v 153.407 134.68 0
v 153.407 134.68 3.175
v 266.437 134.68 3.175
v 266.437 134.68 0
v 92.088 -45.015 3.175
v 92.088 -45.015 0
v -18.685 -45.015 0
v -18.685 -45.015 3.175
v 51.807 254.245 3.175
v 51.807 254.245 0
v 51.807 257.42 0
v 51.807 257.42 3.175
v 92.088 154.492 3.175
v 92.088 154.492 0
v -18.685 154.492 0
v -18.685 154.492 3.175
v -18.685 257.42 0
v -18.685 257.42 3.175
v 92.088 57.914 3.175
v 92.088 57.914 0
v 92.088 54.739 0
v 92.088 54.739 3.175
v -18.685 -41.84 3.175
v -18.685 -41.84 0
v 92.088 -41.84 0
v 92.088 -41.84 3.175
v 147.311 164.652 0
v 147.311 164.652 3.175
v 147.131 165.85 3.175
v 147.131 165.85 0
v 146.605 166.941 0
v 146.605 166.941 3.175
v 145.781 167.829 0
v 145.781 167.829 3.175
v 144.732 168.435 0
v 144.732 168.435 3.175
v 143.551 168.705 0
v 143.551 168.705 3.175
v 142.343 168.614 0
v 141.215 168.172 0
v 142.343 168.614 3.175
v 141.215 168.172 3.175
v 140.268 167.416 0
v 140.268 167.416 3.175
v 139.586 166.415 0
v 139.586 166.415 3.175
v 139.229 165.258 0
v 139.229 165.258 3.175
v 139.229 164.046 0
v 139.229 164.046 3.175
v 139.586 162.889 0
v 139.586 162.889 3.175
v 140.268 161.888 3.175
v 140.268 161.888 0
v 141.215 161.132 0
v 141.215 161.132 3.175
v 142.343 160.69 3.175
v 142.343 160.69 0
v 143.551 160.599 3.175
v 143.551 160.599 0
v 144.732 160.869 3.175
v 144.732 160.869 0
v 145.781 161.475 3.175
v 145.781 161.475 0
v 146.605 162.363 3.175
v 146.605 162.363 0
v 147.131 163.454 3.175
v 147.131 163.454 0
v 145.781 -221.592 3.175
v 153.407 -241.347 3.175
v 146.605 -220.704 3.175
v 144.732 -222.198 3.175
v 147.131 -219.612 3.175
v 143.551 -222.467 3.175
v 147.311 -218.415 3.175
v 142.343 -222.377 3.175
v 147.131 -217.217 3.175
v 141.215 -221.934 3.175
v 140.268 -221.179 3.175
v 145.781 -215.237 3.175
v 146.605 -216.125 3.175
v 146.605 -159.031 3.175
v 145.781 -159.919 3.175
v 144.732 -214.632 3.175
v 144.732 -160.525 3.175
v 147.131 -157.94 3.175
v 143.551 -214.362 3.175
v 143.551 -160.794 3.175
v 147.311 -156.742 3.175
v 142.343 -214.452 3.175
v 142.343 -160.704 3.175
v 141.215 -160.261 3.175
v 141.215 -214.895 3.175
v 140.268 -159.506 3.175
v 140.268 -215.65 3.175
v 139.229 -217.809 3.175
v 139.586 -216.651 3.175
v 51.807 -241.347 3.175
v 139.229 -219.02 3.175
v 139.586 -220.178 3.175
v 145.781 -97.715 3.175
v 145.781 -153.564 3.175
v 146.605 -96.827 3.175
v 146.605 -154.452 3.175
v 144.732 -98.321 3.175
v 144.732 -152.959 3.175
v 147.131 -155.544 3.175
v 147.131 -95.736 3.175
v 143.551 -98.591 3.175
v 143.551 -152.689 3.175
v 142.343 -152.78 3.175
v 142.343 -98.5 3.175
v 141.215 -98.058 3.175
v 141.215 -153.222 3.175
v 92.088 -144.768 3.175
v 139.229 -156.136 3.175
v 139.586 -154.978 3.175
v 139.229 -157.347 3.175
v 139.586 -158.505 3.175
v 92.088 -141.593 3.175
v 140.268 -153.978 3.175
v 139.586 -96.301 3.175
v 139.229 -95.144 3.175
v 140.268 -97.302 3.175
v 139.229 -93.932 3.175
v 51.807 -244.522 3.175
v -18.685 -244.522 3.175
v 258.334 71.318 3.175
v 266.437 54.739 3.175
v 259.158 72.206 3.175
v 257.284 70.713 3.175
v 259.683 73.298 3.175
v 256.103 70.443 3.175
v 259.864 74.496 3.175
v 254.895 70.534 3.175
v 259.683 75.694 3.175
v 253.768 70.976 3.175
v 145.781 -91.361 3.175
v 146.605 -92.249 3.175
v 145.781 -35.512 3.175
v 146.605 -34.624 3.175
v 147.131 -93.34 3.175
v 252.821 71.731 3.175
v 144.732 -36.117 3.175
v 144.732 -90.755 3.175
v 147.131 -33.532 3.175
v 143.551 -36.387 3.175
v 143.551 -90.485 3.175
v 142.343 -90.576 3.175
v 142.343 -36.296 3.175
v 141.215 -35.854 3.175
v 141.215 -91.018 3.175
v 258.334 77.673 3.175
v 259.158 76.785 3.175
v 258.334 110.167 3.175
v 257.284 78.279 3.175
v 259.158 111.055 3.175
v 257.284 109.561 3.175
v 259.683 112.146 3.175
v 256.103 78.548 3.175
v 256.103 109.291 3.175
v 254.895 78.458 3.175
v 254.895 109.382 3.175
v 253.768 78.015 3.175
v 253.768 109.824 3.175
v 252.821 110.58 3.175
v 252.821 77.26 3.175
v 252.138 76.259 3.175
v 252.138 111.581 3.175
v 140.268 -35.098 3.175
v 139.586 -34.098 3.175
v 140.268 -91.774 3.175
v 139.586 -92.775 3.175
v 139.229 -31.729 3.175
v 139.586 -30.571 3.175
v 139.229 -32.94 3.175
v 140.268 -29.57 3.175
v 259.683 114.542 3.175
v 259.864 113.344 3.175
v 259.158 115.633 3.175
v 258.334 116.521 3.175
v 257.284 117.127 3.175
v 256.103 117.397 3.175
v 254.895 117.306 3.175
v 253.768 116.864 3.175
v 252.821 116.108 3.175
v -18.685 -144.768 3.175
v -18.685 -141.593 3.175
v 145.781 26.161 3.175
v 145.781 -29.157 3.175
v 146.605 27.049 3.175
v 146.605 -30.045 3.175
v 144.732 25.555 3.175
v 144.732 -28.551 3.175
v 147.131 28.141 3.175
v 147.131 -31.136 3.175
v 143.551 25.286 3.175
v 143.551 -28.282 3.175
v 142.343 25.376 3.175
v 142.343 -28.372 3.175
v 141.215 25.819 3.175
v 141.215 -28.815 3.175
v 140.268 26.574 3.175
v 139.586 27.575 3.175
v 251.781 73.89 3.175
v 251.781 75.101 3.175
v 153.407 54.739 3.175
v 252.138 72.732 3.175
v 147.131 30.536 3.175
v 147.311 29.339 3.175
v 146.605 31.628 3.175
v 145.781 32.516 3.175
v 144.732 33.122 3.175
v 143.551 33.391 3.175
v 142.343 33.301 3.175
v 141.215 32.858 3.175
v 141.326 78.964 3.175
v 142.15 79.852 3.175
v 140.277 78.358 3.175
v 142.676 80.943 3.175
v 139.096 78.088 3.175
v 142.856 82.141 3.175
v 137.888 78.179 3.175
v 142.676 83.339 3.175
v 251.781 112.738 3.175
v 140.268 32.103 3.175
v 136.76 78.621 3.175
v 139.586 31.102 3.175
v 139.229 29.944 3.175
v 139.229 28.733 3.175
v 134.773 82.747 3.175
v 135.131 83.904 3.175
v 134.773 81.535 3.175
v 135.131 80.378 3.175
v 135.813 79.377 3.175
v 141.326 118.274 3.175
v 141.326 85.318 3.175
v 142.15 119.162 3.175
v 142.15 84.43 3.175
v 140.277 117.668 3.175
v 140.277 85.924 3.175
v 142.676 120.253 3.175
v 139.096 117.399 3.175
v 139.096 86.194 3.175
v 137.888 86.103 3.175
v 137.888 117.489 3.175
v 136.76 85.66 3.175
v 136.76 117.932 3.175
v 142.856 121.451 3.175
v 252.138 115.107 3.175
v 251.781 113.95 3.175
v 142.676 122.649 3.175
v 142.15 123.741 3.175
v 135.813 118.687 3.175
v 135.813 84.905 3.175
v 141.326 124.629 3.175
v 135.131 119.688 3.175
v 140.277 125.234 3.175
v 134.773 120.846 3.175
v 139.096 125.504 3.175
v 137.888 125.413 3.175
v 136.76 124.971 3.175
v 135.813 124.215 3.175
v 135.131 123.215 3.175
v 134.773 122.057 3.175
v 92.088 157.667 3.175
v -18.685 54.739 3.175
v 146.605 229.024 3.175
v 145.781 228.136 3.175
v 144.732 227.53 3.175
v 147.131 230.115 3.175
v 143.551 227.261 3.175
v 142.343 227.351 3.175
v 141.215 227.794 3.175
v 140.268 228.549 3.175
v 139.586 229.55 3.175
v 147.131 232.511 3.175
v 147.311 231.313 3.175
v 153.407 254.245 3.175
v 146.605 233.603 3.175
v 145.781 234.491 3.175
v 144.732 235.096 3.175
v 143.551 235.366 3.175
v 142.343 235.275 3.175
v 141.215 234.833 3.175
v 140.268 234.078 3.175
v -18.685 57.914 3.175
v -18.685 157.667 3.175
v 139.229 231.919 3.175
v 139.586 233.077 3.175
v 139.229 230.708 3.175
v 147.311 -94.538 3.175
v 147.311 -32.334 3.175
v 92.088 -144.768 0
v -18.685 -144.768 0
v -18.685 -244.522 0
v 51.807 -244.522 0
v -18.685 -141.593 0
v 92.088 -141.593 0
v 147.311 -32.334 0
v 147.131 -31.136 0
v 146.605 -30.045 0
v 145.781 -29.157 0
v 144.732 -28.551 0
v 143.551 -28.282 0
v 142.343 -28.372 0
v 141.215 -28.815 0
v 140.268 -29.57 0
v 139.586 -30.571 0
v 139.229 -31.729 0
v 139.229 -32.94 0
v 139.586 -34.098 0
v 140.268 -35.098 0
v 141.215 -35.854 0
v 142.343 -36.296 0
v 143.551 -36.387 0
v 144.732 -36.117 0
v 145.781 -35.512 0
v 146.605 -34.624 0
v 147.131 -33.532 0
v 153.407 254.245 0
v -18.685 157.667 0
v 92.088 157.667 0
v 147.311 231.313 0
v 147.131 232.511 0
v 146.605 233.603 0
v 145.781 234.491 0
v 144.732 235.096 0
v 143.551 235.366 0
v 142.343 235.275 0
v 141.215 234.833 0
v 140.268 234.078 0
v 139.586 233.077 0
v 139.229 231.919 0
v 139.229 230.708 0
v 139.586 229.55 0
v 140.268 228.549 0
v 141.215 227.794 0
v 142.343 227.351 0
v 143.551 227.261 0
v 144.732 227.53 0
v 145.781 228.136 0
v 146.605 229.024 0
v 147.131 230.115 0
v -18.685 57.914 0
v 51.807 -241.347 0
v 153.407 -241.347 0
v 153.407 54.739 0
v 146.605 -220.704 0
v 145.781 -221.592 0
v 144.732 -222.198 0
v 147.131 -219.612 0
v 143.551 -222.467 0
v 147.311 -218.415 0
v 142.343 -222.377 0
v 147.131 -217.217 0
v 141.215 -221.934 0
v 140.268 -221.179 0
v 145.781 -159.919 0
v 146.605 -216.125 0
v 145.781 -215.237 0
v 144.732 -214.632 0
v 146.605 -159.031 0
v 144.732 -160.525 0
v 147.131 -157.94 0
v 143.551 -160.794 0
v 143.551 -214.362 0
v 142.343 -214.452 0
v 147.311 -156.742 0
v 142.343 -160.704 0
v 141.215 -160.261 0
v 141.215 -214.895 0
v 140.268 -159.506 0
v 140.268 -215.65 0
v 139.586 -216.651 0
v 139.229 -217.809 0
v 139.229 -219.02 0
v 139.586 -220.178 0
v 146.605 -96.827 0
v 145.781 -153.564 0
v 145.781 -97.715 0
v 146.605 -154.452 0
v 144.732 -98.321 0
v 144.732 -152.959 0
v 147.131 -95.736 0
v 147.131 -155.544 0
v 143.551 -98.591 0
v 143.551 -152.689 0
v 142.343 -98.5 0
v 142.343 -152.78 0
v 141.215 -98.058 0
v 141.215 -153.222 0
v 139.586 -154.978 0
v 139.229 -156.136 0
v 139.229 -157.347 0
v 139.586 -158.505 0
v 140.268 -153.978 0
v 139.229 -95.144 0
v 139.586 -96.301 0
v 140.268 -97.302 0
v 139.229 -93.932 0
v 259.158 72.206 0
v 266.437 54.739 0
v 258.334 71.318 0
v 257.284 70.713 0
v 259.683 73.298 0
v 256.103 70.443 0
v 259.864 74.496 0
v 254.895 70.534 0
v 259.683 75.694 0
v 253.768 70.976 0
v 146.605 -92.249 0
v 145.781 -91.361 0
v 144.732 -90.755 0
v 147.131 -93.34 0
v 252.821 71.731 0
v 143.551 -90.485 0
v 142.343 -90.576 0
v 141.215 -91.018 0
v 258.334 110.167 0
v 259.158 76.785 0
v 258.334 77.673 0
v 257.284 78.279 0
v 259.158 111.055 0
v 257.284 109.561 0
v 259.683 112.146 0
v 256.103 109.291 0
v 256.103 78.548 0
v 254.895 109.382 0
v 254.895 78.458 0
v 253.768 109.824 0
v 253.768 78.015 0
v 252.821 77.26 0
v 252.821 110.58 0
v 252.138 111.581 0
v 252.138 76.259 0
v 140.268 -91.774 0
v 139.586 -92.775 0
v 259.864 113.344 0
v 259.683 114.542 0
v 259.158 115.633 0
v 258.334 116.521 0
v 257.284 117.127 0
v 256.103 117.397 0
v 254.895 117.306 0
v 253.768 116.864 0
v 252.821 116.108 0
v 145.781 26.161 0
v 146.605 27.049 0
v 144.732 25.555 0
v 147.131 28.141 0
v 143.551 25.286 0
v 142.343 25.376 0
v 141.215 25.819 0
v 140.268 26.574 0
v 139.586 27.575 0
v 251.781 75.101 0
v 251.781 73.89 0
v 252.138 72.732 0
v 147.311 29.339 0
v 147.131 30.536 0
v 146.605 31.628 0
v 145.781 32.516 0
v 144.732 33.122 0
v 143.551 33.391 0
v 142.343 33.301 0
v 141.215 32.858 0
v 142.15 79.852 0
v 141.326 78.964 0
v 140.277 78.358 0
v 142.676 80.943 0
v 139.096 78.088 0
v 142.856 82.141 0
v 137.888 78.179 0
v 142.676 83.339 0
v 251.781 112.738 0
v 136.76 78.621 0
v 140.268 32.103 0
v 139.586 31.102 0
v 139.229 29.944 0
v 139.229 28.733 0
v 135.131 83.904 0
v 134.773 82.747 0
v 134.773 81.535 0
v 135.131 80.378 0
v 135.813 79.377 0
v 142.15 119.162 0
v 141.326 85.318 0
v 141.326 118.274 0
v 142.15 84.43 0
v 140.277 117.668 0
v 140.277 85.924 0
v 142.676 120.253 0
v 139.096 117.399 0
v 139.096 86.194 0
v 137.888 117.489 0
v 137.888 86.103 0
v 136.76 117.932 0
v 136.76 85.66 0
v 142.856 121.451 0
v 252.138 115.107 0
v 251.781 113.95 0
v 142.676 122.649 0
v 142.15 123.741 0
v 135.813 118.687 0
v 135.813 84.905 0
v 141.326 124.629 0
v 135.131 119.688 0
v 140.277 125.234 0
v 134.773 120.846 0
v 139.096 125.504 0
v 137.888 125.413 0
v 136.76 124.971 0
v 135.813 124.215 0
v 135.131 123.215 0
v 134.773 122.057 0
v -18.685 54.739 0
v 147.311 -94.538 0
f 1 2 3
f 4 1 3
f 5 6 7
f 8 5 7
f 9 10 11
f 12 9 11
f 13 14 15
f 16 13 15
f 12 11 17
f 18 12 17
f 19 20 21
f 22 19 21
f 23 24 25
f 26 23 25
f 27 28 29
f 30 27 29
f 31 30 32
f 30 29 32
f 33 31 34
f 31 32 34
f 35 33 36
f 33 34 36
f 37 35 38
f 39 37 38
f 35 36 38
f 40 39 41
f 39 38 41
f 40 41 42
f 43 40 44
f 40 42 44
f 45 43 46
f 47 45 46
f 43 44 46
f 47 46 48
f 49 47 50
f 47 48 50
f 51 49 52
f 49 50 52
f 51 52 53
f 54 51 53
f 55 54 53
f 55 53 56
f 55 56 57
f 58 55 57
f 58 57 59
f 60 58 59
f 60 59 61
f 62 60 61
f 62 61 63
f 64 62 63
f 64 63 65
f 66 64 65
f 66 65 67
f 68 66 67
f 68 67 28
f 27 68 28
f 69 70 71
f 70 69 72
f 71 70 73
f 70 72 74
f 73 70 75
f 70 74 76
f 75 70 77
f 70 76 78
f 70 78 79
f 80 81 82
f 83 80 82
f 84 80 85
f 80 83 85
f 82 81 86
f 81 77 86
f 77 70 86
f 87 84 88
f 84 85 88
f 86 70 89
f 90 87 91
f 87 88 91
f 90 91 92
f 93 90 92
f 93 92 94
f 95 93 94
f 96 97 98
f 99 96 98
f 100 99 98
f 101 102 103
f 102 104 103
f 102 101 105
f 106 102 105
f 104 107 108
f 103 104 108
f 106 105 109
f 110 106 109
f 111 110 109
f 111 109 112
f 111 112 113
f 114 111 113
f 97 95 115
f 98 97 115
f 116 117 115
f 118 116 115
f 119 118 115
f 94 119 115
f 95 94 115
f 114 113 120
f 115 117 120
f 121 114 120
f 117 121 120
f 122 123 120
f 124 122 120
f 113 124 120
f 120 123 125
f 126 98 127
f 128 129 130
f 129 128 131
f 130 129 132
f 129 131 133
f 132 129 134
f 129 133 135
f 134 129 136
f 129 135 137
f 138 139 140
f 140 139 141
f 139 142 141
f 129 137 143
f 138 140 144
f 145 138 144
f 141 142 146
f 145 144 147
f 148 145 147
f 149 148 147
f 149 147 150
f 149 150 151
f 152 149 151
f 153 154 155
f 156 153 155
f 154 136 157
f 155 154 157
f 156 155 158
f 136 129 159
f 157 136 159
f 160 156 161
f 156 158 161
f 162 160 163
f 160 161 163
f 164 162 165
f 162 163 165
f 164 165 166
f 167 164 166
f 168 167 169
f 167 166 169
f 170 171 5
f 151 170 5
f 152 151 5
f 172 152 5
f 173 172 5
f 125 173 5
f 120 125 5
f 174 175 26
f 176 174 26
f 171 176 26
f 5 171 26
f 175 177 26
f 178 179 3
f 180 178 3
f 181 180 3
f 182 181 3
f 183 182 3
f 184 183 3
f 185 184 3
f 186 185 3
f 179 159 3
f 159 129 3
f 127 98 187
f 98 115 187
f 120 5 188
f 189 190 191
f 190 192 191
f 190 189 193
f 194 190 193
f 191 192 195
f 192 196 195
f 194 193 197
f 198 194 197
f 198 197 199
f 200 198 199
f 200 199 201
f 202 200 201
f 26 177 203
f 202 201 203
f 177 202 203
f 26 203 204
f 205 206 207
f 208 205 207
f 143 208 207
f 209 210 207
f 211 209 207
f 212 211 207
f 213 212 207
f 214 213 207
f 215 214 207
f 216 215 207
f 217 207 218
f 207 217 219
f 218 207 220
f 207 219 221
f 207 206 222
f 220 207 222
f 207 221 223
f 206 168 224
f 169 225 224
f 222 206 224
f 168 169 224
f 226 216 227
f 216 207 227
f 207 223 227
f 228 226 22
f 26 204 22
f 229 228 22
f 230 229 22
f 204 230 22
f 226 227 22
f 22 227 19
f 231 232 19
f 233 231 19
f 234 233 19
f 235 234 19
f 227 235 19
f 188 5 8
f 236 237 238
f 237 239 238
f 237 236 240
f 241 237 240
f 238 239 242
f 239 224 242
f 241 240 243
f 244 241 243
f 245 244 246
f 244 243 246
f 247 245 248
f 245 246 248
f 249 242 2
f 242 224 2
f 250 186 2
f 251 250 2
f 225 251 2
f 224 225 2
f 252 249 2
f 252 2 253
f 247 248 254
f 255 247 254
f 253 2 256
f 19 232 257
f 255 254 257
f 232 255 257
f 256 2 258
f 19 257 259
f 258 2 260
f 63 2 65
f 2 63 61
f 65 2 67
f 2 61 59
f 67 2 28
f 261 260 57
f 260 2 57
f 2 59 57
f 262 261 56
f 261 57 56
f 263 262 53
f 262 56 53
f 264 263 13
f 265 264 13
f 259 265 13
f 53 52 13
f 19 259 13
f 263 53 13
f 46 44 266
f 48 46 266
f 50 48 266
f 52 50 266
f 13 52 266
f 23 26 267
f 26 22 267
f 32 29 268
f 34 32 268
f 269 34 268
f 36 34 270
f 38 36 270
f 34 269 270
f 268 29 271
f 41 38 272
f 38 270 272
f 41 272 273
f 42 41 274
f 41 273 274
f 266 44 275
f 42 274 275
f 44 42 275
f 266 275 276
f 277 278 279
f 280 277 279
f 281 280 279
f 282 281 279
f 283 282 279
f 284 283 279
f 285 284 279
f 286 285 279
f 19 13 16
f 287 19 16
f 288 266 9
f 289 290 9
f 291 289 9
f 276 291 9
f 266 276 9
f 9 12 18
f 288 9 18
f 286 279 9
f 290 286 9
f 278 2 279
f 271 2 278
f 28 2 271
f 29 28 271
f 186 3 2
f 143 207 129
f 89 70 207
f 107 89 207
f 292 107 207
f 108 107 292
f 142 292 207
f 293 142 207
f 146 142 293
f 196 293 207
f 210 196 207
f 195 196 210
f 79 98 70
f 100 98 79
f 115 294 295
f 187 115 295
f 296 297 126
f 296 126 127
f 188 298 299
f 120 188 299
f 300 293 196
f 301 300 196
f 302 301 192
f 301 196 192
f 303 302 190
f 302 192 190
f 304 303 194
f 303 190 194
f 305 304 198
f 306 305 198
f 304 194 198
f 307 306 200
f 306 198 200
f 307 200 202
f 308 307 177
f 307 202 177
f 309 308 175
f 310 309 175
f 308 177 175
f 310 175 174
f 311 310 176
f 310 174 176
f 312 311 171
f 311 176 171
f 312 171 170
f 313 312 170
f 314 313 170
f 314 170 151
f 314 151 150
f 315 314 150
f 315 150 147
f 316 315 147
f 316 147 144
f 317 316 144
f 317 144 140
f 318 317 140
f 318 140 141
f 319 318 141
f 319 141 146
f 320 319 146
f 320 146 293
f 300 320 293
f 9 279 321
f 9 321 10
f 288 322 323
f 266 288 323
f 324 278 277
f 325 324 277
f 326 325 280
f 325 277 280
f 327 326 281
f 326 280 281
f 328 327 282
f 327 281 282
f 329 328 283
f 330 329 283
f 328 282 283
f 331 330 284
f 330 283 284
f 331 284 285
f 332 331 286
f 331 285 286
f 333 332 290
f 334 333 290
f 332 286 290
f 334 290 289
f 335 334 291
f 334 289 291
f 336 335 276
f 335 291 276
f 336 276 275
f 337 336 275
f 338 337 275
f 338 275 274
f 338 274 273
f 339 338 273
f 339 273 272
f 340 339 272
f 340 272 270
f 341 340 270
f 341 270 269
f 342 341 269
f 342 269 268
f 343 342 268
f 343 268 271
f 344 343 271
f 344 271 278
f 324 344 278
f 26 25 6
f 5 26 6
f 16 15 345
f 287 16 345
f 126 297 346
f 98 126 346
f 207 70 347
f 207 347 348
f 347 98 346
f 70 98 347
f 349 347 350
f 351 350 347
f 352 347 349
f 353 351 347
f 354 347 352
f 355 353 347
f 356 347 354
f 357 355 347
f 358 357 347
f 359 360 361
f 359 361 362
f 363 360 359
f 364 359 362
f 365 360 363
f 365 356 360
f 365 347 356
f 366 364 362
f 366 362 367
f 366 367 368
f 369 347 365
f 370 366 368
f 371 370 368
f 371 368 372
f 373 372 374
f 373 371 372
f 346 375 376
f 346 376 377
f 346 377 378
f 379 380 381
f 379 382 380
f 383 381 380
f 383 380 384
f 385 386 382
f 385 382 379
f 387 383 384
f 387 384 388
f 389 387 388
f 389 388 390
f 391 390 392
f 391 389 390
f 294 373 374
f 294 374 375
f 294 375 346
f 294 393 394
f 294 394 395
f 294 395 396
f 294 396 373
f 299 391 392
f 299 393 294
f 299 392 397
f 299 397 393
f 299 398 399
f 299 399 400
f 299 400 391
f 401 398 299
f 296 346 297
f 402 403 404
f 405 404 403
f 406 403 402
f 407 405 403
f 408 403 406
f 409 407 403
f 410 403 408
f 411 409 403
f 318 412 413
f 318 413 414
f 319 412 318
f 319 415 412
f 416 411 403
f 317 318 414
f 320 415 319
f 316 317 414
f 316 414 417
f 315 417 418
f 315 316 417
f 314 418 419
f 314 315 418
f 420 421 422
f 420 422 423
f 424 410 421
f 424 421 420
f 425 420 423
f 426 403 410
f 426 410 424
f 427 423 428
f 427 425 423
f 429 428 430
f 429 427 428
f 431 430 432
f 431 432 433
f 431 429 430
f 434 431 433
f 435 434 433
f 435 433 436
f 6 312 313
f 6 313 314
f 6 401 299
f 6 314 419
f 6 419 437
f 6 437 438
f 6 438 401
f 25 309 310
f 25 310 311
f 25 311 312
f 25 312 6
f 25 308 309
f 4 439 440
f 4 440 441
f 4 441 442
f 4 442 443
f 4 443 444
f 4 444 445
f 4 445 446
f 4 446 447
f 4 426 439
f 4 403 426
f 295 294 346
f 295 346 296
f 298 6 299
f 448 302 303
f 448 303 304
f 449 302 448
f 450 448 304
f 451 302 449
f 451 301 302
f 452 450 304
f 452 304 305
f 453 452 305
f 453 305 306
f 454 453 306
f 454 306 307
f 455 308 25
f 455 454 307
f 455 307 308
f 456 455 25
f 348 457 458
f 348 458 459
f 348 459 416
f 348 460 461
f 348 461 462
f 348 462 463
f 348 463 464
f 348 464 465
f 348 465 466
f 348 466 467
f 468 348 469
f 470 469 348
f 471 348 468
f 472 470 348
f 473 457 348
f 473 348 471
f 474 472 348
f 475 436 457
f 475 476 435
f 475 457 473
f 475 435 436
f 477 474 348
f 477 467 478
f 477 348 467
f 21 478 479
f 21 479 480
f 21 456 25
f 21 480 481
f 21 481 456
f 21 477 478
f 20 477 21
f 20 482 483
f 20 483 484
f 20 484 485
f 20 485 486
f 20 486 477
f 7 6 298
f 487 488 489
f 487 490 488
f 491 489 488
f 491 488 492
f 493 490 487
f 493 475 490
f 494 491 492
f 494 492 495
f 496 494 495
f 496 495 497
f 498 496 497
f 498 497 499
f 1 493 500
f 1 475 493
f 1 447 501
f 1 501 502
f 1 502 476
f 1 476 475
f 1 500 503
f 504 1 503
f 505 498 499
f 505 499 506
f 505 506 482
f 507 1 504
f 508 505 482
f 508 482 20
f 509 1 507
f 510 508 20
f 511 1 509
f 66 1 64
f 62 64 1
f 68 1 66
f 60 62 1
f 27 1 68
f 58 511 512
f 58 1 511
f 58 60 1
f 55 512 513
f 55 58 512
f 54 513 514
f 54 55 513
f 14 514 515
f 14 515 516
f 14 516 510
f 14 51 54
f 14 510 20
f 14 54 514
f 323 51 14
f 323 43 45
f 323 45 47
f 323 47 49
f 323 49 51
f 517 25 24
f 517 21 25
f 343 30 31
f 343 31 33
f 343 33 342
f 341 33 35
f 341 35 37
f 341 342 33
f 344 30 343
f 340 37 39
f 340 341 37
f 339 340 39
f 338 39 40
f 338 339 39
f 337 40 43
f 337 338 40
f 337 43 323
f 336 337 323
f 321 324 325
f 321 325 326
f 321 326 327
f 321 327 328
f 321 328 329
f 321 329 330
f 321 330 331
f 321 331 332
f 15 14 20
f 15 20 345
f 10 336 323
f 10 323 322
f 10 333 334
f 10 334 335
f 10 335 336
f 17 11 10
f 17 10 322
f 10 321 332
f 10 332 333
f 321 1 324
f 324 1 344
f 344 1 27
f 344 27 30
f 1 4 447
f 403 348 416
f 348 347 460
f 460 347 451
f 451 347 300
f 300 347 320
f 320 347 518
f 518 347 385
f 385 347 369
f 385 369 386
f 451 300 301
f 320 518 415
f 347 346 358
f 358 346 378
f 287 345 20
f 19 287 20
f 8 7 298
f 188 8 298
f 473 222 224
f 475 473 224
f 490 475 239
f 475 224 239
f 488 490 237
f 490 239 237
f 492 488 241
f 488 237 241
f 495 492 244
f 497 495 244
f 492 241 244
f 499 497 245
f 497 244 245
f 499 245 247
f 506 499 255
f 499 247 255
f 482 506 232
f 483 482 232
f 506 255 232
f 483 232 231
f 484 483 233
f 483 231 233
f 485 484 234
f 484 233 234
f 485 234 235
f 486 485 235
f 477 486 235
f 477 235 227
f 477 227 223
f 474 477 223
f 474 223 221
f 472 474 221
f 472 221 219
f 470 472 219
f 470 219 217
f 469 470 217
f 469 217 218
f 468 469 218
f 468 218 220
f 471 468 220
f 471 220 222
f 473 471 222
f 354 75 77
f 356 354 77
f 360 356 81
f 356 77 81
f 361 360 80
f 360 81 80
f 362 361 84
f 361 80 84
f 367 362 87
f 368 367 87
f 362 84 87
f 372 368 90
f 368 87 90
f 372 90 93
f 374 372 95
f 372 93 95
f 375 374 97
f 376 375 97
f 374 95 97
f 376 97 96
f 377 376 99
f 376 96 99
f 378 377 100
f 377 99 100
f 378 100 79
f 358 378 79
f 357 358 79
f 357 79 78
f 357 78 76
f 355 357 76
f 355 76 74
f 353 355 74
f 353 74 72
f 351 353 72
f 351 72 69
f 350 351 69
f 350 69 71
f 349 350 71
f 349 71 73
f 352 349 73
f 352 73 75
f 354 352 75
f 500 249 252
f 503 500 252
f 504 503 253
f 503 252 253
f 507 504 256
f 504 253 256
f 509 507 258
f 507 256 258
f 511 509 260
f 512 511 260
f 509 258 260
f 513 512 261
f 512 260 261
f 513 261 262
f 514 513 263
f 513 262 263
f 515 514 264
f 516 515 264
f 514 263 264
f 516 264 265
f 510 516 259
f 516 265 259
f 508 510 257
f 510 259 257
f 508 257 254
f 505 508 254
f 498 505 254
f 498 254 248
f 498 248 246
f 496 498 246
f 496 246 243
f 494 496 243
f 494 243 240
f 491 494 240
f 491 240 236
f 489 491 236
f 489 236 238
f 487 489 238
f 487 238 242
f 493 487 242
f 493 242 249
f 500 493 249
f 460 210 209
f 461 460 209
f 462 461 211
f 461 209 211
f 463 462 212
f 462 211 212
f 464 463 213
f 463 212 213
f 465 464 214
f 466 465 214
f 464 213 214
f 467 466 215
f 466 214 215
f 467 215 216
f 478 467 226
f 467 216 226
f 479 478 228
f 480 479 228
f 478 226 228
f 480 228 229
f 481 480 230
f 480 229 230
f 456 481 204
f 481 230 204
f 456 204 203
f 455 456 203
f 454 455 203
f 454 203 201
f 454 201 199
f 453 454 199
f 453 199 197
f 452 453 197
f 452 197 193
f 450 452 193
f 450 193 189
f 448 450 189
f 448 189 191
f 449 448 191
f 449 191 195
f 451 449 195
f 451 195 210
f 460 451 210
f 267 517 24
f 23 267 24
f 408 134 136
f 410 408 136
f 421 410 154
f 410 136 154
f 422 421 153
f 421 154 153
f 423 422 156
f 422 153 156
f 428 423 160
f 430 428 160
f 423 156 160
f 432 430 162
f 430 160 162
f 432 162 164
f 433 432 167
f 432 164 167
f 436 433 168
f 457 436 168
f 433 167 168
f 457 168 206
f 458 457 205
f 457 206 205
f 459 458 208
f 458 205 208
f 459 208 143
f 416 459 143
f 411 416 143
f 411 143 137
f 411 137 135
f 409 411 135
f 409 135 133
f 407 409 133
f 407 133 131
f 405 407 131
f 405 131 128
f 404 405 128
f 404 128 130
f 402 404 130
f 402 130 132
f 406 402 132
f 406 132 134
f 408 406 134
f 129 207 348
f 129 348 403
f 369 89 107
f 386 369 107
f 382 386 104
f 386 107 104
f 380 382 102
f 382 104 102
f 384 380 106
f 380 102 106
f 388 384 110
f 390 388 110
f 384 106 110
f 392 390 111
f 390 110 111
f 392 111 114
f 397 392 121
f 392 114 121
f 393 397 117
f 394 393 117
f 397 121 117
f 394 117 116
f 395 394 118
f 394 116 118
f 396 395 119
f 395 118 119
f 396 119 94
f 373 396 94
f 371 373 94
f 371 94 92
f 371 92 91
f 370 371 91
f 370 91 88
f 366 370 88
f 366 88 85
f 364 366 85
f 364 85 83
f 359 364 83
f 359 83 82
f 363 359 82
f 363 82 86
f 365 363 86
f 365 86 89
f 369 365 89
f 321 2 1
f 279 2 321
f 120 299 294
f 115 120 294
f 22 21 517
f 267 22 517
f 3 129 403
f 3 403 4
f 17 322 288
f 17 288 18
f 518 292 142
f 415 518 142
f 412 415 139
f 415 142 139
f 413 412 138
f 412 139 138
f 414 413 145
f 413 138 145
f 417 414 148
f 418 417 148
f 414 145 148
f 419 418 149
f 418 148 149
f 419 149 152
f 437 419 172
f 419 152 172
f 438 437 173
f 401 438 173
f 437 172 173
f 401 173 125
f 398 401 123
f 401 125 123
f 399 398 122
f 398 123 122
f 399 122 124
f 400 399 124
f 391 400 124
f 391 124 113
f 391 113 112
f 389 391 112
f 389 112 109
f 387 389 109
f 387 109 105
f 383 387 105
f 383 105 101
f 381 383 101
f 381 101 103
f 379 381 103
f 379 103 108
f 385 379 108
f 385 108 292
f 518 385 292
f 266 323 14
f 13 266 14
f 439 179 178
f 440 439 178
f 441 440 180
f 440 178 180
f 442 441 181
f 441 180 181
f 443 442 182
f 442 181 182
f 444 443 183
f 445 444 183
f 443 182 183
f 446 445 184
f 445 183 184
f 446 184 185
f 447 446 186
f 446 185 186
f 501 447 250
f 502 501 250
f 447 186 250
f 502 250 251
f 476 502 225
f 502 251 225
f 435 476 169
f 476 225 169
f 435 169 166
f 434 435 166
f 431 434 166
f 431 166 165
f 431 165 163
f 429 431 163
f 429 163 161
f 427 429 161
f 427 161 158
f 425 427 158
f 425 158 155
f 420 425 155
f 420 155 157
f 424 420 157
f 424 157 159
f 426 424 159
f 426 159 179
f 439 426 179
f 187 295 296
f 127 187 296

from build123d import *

# Parameters (mm, degrees)
BOSS_EXTRUDE2_DEPTH = 3.175
BOSS_EXTRUDE3_DEPTH = 3.175
SKETCH11_W          = 113.03
SKETCH11_H          = 79.94142
BOSS_EXTRUDE8_DEPTH = 3.175
SKETCH12_W          = 70.49262
SKETCH12_H          = 3.175
BOSS_EXTRUDE9_DEPTH = 3.175
SKETCH15_R          = 4.064
CUT_EXTRUDE1_DEPTH  = 371.49176257
SKETCH16_R          = 4.064
CUT_EXTRUDE2_DEPTH  = 371.49176257


with BuildPart() as part:
    # Sketch1 → Boss-Extrude2 (new body)
    with BuildSketch(Plane.XY):
        Polygon((129.013076168, 254.245404572), (-18.685383832, 254.245404572), (-18.685383832, 157.666984572), (92.088461168, 157.666984572), (92.088461168, 154.491984572), (-18.685383832, 154.491984572), (-18.685383832, 57.913564572), (92.088461168, 57.913564572), (92.088461168, 54.738564572), (-18.685383832, 54.738564572), (-18.685383832, -41.839855428), (92.088461168, -41.839855428), (92.088461168, -45.014855428), (-18.685383832, -45.014855428), (-18.685383832, -141.593275428), (92.088461168, -141.593275428), (92.088461168, -144.768275428), (-18.685383832, -144.768275428), (-18.685383832, -241.346695428), (129.013076168, -241.346695428), align=None)
    extrude(amount=BOSS_EXTRUDE2_DEPTH)

    # Sketch4 → Boss-Extrude3 (add, through all)
    with BuildSketch(Plane.XY.offset(3.175)):
        Polygon((129.013076168, 254.245404572), (129.013076168, -241.346695428), (153.407236168, -241.346695428), (153.407236168, -227.262720585), (153.407236168, 240.16142973), (153.407236168, 254.245404572), align=None)
    extrude(amount=-BOSS_EXTRUDE3_DEPTH)

    # Sketch11 → Boss-Extrude8 (add, through all)
    with BuildSketch(Plane.XY.offset(3.175)):
        with Locations((209.922236168, 94.709274572)):
            Rectangle(SKETCH11_W, SKETCH11_H)
    extrude(amount=-BOSS_EXTRUDE8_DEPTH)

    # Sketch12 → Boss-Extrude9 (add, through all)
    with BuildSketch(Plane(origin=(0, 0, 0), x_dir=(-1, 0, 0), z_dir=(0, 0, -1))):
        with Locations((-16.560926168, 255.832904572)):
            Rectangle(SKETCH12_W, SKETCH12_H)
        with Locations((-16.560926168, -242.934195428)):
            Rectangle(SKETCH12_W, SKETCH12_H)
    extrude(amount=-BOSS_EXTRUDE9_DEPTH)

    # Sketch15 → Cut-Extrude1 (cut, through all)
    with BuildSketch(Plane.XY.offset(3.175)):
        with Locations((143.247236168, 231.313297791)):
            Circle(SKETCH15_R)
        with Locations((143.247236168, 164.651984572)):
            Circle(SKETCH15_R)
        with Locations((255.799716168, 113.343984572)):
            Circle(SKETCH15_R)
        with Locations((255.799716168, 74.495671354)):
            Circle(SKETCH15_R)
        with Locations((143.247236168, 29.338564572)):
            Circle(SKETCH15_R)
        with Locations((143.247236168, -32.334232694)):
            Circle(SKETCH15_R)
        with Locations((143.247236168, -94.538012037)):
            Circle(SKETCH15_R)
        with Locations((143.247236168, -156.74179138)):
            Circle(SKETCH15_R)
        with Locations((143.247236168, -218.414588646)):
            Circle(SKETCH15_R)
    extrude(amount=-CUT_EXTRUDE1_DEPTH, mode=Mode.SUBTRACT)

    # Sketch16 → Cut-Extrude2 (cut, through all)
    with BuildSketch(Plane.XY.offset(3.175)):
        with Locations((138.792076168, 121.451235566)):
            Circle(SKETCH16_R)
        with Locations((138.792076168, 82.140925566)):
            Circle(SKETCH16_R)
    extrude(amount=-CUT_EXTRUDE2_DEPTH, mode=Mode.SUBTRACT)


solid = part.part
